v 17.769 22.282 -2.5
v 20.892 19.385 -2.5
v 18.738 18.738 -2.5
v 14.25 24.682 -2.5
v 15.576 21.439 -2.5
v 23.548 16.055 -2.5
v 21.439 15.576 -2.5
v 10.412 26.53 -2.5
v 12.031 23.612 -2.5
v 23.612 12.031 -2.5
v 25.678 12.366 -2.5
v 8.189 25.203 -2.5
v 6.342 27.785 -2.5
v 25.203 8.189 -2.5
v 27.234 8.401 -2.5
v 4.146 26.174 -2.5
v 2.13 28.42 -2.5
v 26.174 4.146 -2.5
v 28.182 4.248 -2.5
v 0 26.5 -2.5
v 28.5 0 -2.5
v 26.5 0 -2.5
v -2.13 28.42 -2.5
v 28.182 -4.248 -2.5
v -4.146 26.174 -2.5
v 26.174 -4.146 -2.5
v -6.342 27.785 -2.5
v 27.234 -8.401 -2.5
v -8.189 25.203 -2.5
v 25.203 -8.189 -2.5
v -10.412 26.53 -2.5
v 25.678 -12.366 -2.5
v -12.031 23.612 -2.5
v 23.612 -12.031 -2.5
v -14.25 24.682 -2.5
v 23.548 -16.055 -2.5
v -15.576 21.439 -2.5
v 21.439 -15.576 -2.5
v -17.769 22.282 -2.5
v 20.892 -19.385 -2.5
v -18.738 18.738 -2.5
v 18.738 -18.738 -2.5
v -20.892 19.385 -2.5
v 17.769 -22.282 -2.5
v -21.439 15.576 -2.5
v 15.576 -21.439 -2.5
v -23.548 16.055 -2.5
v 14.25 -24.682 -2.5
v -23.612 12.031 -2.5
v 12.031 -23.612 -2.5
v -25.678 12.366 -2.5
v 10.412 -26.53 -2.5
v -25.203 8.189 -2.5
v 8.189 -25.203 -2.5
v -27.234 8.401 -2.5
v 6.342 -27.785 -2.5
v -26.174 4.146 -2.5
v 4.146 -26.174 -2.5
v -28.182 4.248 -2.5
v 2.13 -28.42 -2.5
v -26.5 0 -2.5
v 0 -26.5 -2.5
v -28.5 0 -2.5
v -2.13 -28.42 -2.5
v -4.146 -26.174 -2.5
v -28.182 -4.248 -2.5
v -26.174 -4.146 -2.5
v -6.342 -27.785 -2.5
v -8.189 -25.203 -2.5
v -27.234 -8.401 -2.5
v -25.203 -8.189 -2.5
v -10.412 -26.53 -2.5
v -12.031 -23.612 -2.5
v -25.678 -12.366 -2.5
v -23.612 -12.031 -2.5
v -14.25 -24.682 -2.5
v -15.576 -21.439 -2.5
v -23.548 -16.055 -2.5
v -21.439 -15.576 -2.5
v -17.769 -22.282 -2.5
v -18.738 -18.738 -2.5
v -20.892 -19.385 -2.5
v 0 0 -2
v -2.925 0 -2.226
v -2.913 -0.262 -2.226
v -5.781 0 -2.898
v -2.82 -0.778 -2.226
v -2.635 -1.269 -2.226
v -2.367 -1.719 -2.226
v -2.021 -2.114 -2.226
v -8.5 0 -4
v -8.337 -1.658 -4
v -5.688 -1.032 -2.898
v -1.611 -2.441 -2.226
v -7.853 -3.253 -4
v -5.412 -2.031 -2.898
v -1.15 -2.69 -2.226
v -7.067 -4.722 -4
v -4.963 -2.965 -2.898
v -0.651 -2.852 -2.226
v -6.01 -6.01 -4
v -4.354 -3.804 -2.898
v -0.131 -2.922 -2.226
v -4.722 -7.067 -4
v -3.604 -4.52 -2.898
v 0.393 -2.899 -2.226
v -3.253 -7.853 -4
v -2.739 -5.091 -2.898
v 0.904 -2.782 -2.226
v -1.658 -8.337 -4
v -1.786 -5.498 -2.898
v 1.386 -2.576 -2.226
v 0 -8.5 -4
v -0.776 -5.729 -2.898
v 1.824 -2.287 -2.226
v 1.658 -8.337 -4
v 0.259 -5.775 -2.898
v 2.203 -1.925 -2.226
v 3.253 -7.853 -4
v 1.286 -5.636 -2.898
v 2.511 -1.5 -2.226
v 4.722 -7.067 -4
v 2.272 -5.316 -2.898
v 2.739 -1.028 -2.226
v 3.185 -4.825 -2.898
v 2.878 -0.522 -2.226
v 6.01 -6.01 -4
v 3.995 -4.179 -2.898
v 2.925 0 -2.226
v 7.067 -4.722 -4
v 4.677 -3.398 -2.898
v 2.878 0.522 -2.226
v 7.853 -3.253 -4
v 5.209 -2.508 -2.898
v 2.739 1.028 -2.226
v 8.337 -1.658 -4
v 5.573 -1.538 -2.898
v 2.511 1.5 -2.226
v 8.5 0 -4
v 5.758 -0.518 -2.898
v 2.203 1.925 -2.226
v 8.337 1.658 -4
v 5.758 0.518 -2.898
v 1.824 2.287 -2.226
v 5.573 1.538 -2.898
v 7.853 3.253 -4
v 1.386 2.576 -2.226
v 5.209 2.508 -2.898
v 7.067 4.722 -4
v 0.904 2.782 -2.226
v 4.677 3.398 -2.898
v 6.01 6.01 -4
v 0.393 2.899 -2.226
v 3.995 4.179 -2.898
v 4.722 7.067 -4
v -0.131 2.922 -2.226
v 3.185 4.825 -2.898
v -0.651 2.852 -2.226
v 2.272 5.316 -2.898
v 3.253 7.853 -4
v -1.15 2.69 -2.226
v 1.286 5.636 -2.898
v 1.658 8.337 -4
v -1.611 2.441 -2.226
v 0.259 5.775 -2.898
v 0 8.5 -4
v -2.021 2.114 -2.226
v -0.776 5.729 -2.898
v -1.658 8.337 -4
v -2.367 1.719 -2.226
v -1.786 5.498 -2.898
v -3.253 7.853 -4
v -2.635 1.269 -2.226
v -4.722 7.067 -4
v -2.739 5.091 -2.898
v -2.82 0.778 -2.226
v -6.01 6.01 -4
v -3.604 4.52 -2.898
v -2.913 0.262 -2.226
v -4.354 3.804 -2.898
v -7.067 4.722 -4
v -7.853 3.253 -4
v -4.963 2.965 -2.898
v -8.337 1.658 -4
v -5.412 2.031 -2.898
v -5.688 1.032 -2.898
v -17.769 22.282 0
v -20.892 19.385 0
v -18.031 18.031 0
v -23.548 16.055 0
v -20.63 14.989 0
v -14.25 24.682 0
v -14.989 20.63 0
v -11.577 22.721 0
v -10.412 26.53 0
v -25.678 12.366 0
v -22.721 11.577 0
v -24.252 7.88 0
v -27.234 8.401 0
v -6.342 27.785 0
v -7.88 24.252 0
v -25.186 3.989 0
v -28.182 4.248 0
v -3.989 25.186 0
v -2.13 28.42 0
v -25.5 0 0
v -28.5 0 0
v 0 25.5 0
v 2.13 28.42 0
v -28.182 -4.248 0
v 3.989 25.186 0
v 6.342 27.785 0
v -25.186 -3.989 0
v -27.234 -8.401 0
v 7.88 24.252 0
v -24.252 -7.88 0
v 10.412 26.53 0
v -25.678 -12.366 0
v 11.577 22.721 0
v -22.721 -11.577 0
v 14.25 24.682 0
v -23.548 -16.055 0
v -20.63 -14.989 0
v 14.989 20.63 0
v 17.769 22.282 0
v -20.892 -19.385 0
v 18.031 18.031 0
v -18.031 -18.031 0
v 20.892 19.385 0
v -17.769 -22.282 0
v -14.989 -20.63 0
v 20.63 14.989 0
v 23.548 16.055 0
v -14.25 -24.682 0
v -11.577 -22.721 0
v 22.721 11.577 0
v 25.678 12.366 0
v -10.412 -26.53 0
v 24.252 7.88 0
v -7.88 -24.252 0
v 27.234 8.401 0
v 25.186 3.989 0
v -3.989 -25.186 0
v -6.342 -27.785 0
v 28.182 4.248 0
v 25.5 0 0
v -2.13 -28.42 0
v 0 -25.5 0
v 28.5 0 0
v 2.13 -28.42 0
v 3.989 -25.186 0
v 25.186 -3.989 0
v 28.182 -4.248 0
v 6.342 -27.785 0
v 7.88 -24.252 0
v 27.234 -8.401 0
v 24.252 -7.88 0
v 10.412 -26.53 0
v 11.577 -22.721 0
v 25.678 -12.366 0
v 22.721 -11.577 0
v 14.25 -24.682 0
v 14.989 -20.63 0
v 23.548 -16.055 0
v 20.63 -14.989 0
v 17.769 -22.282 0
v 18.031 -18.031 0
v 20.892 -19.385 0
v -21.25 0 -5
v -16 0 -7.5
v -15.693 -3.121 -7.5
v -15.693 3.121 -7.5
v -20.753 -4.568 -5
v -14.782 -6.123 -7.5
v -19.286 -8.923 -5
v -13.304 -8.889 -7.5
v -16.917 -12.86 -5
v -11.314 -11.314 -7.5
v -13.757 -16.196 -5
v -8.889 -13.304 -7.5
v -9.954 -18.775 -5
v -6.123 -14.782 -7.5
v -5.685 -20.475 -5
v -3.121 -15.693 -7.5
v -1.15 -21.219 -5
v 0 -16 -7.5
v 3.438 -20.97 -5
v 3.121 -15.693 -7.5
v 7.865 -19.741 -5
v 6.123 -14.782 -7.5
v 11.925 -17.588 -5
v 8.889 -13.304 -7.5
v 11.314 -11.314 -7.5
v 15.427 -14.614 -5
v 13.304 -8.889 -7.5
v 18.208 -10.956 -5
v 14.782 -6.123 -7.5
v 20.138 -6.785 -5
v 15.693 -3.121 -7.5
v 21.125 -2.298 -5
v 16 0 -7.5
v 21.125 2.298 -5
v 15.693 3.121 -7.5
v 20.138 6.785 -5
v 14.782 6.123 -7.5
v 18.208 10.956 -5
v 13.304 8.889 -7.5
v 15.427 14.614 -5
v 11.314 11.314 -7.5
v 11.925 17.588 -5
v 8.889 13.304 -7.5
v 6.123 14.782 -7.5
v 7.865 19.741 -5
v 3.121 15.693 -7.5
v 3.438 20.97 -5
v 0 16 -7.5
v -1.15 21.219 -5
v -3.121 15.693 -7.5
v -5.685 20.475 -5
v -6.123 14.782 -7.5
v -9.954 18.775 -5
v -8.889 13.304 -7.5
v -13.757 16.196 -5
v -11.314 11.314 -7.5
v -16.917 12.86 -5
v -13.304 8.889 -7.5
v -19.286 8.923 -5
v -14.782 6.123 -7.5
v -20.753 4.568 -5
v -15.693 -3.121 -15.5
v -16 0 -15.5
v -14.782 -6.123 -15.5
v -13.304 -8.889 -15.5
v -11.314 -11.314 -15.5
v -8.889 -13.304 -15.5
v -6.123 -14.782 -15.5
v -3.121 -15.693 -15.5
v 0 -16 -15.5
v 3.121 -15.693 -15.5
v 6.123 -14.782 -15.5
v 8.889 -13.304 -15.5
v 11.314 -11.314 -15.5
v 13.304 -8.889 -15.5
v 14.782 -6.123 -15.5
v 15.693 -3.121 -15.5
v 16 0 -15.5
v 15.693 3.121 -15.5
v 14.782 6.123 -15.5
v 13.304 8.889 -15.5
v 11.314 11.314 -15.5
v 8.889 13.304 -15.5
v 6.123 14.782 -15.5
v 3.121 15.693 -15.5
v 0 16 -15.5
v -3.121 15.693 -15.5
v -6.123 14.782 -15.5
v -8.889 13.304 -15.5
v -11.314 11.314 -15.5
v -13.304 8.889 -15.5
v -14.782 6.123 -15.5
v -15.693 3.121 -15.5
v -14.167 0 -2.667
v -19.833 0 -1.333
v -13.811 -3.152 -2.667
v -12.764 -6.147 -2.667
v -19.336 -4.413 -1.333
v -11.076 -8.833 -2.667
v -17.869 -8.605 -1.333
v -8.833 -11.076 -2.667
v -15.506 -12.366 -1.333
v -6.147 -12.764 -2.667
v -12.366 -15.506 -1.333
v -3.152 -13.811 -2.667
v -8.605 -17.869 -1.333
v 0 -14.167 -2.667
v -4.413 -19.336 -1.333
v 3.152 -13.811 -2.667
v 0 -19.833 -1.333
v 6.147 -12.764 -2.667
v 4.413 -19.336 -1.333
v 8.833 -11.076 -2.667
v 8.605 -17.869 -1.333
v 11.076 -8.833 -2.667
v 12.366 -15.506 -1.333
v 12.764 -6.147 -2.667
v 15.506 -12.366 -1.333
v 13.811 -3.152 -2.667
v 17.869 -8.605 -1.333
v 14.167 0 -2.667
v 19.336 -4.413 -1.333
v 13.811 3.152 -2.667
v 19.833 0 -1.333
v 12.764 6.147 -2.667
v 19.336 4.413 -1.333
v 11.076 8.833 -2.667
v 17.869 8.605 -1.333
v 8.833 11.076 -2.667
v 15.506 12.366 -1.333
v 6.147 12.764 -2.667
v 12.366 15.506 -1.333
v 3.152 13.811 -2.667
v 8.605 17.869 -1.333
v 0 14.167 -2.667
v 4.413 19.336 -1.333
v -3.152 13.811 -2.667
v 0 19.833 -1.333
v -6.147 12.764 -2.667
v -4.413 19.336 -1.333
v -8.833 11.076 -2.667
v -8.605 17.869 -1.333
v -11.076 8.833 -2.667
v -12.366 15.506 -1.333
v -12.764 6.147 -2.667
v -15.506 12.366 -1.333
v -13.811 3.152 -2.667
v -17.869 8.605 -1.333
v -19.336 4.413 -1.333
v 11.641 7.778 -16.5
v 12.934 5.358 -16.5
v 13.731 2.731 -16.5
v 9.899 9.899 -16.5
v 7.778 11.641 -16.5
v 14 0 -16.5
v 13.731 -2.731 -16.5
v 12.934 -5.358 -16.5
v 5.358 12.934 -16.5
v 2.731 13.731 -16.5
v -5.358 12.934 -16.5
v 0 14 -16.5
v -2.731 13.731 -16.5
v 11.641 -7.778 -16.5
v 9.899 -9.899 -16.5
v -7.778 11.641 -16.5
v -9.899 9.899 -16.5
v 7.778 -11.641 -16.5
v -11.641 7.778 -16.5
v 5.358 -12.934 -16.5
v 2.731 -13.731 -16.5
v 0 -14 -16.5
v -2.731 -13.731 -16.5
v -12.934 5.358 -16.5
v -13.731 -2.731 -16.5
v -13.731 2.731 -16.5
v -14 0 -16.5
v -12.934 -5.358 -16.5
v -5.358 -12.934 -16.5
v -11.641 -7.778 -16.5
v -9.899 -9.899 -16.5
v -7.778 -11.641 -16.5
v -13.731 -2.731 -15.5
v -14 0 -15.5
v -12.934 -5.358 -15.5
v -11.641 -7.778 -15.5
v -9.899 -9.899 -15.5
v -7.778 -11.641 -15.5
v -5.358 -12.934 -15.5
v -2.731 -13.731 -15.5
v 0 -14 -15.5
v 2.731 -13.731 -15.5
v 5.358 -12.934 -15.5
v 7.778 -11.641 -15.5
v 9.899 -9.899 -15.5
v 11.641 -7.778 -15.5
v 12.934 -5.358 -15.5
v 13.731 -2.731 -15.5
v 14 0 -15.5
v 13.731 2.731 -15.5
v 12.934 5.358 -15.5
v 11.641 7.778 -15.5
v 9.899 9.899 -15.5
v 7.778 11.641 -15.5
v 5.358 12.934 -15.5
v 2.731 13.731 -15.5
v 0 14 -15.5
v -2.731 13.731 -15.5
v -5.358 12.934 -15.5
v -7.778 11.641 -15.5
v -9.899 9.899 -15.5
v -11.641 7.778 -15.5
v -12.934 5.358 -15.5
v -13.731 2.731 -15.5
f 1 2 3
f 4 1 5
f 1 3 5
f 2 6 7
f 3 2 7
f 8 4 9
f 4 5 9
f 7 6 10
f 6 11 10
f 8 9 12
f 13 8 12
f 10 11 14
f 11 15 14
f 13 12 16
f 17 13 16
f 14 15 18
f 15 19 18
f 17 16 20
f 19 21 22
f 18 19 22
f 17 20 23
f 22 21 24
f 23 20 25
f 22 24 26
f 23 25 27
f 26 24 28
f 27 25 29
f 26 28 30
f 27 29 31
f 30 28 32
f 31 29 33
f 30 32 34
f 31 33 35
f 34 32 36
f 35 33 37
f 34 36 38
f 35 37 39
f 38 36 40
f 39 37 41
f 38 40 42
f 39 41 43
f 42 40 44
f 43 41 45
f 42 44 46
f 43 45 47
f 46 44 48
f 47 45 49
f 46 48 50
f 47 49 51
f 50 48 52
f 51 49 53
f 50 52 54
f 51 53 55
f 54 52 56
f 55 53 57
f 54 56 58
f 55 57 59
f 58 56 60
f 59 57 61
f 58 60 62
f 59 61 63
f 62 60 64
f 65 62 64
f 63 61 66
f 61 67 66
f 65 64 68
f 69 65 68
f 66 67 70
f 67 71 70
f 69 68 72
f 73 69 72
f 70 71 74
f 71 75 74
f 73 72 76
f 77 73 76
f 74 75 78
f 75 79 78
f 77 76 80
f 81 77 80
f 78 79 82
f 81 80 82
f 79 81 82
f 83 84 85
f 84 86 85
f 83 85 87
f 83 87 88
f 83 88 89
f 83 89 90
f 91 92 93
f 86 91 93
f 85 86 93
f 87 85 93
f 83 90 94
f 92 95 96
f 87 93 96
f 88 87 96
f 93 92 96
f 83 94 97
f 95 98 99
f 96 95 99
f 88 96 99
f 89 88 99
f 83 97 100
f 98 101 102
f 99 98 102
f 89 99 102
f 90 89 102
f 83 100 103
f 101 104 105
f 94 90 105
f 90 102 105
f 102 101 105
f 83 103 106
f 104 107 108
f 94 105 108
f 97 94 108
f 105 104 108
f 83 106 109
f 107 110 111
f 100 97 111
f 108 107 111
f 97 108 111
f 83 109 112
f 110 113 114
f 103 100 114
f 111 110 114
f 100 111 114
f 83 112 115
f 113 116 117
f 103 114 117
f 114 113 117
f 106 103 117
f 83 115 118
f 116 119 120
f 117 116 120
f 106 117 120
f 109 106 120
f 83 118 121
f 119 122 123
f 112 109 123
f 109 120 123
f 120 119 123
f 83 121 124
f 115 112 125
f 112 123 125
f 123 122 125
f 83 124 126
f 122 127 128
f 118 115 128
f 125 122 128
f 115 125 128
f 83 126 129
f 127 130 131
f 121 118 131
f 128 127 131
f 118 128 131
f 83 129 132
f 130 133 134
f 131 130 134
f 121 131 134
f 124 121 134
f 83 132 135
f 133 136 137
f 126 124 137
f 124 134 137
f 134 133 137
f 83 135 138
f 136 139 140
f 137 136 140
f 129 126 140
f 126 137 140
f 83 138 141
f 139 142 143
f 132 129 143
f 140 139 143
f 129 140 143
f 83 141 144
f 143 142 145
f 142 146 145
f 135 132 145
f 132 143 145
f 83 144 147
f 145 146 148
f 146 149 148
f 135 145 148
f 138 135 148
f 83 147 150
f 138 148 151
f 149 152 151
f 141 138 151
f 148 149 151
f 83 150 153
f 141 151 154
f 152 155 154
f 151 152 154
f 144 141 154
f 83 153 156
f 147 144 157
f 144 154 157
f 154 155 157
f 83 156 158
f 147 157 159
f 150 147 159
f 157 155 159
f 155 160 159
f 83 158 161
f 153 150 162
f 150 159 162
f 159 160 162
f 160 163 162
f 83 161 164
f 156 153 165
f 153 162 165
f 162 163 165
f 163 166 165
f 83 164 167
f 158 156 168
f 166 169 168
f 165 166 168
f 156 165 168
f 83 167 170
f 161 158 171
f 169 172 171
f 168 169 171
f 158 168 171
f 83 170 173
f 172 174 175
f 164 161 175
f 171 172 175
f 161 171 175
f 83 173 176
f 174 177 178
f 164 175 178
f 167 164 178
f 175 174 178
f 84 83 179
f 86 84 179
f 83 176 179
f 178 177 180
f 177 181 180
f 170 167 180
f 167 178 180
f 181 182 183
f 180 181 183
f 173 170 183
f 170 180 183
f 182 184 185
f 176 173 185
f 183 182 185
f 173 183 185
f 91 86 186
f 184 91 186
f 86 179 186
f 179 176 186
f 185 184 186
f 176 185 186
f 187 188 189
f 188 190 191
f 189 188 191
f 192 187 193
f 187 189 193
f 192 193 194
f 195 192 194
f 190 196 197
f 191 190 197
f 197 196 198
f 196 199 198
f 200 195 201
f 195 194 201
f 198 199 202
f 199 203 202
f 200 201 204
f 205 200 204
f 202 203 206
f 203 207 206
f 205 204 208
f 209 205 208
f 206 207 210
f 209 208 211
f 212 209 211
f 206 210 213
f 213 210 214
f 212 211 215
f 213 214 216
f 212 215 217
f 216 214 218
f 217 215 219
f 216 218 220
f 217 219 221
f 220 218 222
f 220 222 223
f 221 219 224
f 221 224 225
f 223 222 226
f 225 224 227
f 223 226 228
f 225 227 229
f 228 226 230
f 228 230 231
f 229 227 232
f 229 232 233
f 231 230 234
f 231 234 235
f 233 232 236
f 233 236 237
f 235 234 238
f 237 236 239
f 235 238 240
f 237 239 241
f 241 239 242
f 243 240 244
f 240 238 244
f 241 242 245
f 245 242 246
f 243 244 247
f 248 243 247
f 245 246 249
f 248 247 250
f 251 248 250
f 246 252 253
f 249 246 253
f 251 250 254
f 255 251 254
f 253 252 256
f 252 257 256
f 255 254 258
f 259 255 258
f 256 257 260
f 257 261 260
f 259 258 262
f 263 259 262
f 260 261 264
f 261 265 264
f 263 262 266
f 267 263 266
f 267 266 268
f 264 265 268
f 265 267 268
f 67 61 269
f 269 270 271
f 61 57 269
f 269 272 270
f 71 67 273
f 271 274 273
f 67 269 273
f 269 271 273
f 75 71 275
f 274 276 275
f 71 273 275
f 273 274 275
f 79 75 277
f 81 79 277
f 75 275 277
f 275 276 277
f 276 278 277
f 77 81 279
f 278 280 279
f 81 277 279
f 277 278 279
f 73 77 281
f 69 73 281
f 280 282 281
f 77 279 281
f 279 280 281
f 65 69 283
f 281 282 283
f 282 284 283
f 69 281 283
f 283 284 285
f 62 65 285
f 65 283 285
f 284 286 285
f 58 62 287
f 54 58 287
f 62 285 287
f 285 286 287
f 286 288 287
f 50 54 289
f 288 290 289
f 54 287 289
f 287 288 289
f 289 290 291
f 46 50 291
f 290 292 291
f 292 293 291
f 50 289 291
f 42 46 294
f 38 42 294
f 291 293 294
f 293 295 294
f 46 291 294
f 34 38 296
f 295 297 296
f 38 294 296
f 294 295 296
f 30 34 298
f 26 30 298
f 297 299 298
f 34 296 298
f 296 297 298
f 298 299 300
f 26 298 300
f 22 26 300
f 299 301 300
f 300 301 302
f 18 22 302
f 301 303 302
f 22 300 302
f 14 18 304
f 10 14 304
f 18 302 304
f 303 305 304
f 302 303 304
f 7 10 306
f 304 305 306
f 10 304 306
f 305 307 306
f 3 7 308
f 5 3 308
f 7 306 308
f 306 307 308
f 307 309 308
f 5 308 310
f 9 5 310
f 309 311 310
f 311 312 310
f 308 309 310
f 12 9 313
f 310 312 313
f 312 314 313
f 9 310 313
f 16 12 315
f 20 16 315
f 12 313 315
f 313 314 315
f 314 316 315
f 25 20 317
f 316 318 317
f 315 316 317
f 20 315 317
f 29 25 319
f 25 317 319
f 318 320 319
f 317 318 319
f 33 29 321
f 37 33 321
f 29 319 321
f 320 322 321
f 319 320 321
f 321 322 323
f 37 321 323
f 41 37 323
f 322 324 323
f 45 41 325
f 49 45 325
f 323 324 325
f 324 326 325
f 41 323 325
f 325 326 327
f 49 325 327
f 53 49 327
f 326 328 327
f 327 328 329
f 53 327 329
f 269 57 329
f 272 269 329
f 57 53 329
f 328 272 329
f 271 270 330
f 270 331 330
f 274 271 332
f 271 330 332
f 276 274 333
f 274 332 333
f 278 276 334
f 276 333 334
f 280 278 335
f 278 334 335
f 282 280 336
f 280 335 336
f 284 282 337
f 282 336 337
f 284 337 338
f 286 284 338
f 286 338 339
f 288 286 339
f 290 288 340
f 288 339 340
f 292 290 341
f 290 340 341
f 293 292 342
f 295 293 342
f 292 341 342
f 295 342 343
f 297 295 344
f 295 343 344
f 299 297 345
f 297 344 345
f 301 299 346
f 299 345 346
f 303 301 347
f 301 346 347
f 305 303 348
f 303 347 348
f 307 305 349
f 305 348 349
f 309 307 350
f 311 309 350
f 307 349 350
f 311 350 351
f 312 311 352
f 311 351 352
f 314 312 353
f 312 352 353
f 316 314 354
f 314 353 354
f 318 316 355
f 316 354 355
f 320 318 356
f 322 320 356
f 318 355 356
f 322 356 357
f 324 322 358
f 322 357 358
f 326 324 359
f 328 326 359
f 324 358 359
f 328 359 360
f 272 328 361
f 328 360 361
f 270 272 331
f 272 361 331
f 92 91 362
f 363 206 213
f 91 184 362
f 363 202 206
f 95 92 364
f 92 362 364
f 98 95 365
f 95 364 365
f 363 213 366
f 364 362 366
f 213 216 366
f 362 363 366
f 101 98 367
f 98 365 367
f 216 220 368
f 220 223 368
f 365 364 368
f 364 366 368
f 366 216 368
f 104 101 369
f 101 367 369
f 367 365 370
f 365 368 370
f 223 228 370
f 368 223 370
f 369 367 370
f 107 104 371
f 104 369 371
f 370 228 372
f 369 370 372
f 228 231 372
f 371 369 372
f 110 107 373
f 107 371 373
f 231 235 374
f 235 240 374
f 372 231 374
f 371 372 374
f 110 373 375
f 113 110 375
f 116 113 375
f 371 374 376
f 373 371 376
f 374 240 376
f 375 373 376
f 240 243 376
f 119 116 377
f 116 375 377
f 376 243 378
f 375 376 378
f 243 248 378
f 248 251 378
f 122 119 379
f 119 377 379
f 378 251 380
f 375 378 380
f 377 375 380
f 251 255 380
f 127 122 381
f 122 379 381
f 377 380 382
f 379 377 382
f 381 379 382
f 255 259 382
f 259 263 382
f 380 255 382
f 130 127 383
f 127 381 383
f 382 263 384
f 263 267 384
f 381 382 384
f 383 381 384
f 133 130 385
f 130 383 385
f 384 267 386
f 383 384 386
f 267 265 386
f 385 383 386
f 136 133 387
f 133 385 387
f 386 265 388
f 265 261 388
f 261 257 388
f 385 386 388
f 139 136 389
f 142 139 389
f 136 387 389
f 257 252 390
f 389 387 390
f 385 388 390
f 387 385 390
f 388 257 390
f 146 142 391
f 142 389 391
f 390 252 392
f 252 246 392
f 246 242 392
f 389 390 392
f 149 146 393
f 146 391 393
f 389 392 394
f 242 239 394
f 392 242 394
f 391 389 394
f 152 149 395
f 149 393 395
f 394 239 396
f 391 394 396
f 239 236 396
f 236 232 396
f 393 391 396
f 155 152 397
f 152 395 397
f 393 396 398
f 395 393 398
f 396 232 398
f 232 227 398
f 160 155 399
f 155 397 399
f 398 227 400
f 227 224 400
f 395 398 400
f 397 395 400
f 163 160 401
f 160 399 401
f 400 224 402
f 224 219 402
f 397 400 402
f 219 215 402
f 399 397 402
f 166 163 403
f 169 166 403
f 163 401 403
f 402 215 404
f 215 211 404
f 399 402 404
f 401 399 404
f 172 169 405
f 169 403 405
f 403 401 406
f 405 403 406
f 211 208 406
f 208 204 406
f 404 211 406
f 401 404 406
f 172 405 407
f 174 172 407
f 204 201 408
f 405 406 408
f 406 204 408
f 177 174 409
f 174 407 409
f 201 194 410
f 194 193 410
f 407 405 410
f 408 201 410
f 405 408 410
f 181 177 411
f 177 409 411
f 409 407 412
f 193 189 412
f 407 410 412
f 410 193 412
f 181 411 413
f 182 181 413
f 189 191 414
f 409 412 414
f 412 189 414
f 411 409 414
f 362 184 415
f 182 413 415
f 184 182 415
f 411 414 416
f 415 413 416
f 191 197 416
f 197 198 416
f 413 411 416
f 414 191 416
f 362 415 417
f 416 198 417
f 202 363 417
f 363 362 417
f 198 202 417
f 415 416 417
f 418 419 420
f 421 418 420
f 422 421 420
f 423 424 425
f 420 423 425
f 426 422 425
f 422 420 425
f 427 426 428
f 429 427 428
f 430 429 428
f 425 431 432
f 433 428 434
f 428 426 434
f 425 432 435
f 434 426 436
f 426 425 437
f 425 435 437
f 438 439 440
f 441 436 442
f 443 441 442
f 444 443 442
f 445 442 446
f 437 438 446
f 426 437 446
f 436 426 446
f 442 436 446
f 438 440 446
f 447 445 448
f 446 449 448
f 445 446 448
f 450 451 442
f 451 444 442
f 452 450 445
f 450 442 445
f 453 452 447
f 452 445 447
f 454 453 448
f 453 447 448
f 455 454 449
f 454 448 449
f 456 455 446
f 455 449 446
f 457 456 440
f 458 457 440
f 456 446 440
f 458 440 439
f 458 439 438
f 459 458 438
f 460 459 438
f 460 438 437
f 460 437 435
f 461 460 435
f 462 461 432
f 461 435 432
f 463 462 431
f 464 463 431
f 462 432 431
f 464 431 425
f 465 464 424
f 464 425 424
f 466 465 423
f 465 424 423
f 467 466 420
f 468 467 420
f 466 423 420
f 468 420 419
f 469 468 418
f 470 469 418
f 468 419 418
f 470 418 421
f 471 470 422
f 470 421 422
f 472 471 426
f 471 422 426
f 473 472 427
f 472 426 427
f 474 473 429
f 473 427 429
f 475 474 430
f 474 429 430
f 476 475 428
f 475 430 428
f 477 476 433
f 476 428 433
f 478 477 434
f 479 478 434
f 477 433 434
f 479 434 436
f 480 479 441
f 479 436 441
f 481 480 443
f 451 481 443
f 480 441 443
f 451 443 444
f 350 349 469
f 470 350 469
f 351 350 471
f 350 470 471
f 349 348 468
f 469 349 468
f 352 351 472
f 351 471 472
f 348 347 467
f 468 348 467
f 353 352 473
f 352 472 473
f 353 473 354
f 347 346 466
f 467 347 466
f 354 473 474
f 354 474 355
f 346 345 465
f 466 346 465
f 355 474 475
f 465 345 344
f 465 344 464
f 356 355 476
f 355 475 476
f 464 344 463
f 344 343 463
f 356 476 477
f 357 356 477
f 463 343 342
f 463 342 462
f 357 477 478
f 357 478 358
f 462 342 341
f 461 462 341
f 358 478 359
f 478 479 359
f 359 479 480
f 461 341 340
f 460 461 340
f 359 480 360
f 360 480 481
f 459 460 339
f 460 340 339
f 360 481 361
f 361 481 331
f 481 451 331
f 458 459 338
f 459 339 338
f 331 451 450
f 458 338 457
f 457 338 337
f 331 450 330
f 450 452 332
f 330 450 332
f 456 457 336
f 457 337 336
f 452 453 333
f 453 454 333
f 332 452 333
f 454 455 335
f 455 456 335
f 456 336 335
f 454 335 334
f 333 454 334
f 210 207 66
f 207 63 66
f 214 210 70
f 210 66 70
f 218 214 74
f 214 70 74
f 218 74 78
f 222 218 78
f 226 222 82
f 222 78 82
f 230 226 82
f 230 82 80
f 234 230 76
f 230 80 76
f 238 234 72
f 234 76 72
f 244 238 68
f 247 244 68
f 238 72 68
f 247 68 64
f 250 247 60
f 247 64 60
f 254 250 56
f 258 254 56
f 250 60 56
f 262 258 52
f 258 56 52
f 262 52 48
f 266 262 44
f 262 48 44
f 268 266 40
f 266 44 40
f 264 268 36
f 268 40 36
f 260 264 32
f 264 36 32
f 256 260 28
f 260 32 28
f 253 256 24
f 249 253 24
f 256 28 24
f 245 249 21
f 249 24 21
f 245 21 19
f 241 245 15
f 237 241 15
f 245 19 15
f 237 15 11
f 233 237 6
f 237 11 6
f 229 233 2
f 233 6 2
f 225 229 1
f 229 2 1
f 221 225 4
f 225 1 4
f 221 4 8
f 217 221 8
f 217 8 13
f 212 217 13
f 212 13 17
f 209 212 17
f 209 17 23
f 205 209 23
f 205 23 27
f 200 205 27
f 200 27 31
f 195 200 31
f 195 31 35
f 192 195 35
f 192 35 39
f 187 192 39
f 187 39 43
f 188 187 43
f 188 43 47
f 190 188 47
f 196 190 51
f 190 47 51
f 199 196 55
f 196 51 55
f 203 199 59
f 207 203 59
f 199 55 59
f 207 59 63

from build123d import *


with BuildPart() as part:
    # Sketch2 → Revolve1 (revolve)
    with BuildSketch(Plane(origin=(0, 0, 0), x_dir=(1, 0, 0), z_dir=(0, 1, 0)), mode=Mode.PRIVATE) as revolve1_sk:
        with BuildLine():
            Line((25.5, 0), (28.5, 0))
            Line((28.5, 0), (28.5, 2.5))
            Line((28.5, 2.5), (26.5, 2.5))
            Line((26.5, 2.5), (16, 7.5))
            Line((16, 7.5), (16, 15.5))
            Line((16, 15.5), (14, 15.5))
            Line((14, 15.5), (14, 16.5))
            Line((14, 16.5), (0, 16.5))
            Line((0, 16.5), (0, 2))
            ThreePointArc((0, 2), (4.366062299, 2.506735229), (8.5, 4))
            Line((8.5, 4), (25.5, 0))
        make_face()
    revolve(revolve1_sk.sketch.rotate(Axis((0, 0, -16.5), (0, 0, 1)), 180), axis=Axis((0, 0, -16.5), (0, 0, 1)))


solid = part.part
